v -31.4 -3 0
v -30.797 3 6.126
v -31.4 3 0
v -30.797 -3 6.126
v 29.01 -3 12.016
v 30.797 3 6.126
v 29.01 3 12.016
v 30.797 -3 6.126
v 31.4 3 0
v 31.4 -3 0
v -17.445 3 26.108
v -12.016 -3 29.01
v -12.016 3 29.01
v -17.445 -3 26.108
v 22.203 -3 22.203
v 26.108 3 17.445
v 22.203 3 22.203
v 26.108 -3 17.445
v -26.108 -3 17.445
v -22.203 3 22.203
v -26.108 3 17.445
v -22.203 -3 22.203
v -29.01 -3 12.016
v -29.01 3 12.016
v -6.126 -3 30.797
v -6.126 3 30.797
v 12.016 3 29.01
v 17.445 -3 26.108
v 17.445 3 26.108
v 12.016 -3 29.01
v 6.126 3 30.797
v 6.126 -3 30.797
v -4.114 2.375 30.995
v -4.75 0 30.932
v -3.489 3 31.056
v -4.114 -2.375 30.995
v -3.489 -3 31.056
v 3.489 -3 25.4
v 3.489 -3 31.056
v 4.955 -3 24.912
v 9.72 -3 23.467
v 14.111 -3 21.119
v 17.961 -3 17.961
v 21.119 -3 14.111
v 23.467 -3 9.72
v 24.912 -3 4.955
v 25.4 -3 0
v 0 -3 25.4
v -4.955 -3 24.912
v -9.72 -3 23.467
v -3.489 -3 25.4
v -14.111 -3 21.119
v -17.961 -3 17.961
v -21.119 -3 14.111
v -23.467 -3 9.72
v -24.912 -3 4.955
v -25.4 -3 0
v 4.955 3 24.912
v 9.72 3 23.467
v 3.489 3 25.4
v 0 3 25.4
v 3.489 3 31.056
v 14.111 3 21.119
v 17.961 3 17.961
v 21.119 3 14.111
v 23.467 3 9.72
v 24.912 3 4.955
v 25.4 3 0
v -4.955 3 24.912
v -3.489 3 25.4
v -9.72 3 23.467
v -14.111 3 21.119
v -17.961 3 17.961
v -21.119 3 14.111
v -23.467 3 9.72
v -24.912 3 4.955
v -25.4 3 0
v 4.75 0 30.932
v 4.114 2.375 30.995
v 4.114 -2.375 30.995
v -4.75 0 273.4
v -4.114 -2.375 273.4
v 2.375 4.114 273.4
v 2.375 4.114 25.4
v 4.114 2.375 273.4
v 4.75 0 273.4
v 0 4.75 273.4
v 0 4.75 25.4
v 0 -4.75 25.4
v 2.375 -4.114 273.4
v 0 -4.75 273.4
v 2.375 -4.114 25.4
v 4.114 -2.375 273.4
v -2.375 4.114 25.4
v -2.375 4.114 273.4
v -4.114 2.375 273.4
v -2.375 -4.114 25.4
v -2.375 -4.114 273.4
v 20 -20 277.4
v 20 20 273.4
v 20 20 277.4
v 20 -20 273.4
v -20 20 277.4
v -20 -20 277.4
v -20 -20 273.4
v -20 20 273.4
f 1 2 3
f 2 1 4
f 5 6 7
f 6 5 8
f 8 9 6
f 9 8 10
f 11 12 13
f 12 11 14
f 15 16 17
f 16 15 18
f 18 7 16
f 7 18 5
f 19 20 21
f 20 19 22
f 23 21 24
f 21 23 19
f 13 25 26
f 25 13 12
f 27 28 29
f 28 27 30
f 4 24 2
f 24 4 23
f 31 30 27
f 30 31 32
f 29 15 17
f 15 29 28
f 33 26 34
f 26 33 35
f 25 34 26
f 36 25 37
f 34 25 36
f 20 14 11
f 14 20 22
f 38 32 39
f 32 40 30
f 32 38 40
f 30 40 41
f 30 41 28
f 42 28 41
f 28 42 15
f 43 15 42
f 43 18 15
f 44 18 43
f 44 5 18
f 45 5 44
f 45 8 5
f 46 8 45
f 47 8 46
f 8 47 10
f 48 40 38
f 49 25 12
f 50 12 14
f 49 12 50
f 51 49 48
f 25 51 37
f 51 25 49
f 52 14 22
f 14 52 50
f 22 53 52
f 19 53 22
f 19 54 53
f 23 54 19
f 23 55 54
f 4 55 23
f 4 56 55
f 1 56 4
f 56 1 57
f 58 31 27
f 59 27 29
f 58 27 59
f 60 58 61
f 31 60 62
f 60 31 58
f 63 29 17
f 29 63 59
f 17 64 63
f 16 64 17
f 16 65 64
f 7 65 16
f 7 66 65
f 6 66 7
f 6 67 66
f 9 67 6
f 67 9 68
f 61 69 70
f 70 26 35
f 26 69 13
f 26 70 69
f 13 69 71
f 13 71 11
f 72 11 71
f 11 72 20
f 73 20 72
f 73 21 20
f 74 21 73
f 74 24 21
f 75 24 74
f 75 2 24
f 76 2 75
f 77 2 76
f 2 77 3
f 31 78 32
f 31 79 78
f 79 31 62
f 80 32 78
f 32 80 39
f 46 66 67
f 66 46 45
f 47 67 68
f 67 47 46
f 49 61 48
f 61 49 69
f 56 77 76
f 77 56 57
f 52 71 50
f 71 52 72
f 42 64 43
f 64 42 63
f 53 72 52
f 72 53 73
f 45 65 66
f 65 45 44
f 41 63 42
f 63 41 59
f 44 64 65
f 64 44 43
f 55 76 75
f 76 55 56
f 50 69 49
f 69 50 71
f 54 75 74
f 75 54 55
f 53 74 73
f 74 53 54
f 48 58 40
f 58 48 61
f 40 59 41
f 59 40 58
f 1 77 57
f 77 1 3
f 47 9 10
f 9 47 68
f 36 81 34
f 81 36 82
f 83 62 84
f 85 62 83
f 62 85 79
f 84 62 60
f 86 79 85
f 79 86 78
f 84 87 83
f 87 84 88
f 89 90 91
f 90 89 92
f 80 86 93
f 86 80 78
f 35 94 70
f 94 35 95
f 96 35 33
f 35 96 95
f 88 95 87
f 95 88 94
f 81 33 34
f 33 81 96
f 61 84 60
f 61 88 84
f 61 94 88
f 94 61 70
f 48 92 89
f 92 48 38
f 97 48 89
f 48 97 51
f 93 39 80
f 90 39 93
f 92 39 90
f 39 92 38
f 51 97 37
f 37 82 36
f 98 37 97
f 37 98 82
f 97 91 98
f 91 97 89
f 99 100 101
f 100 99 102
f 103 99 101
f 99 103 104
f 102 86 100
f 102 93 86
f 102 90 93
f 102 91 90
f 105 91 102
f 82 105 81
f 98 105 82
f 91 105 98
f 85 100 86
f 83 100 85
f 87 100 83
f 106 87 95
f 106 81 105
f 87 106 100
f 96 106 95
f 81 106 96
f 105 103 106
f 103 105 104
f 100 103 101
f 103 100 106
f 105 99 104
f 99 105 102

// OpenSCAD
// Sprinkler-pipe hanger: U-bolt + threaded rod + ceiling clip.
// NFPA 13 §17 mandates one hanger per pipe segment (per spacing
// table). Local origin = pipe center; rod extends UP.
// V2 Phase 4.1.
//
// @part hanger
// @kind hanger
// @category hanger.clevis
// @display-name "Clevis Hanger + Rod (2\")"
// @mfg anvil
// @mfg-pn Fig-260
// @price-usd 6.50
// @install-minutes 10
// @crew apprentice
// @param pipe_size_in enum[1,1.25,1.5,2,2.5,3,4] default=2 label="Pipe Size" unit="in"
// @param rod_length_mm number[100,1000] default=250 label="Rod Length" unit="mm"
// @param rod_diameter_mm number[6,13] default=9.5 label="Rod Diameter" unit="mm"
// @port pipe position=[0,0,0] direction=[0,0,1] style=none size_in=2 role=branch

pipe_size_in = 2;
rod_length_mm = 250;          // 10" drop typical
rod_diameter_mm = 9.5;        // 3/8" all-thread

mm_per_in = 25.4;
pipe_dia_mm = pipe_size_in * mm_per_in;
ubolt_thick_mm = 6;

// U-bolt (curved part = simplified torus arc; we use a cylinder
// rim for OpenSCAD simplicity)
difference() {
    rotate([90, 0, 0])
        cylinder(h = ubolt_thick_mm, r = pipe_dia_mm / 2 + ubolt_thick_mm,
                 center = true, $fn = 32);
    rotate([90, 0, 0])
        cylinder(h = ubolt_thick_mm + 1, r = pipe_dia_mm / 2,
                 center = true, $fn = 32);
    // chop off the bottom half (open below the pipe)
    translate([0, 0, -100]) cube([200, 200, 200], center = true);
}

// Threaded rod going up
translate([0, 0, rod_length_mm / 2 + pipe_dia_mm / 2])
    cylinder(h = rod_length_mm, r = rod_diameter_mm / 2, center = true, $fn = 12);

// Ceiling clip (flat plate)
translate([0, 0, rod_length_mm + pipe_dia_mm / 2])
    cube(size = [40, 40, 4], center = true);
